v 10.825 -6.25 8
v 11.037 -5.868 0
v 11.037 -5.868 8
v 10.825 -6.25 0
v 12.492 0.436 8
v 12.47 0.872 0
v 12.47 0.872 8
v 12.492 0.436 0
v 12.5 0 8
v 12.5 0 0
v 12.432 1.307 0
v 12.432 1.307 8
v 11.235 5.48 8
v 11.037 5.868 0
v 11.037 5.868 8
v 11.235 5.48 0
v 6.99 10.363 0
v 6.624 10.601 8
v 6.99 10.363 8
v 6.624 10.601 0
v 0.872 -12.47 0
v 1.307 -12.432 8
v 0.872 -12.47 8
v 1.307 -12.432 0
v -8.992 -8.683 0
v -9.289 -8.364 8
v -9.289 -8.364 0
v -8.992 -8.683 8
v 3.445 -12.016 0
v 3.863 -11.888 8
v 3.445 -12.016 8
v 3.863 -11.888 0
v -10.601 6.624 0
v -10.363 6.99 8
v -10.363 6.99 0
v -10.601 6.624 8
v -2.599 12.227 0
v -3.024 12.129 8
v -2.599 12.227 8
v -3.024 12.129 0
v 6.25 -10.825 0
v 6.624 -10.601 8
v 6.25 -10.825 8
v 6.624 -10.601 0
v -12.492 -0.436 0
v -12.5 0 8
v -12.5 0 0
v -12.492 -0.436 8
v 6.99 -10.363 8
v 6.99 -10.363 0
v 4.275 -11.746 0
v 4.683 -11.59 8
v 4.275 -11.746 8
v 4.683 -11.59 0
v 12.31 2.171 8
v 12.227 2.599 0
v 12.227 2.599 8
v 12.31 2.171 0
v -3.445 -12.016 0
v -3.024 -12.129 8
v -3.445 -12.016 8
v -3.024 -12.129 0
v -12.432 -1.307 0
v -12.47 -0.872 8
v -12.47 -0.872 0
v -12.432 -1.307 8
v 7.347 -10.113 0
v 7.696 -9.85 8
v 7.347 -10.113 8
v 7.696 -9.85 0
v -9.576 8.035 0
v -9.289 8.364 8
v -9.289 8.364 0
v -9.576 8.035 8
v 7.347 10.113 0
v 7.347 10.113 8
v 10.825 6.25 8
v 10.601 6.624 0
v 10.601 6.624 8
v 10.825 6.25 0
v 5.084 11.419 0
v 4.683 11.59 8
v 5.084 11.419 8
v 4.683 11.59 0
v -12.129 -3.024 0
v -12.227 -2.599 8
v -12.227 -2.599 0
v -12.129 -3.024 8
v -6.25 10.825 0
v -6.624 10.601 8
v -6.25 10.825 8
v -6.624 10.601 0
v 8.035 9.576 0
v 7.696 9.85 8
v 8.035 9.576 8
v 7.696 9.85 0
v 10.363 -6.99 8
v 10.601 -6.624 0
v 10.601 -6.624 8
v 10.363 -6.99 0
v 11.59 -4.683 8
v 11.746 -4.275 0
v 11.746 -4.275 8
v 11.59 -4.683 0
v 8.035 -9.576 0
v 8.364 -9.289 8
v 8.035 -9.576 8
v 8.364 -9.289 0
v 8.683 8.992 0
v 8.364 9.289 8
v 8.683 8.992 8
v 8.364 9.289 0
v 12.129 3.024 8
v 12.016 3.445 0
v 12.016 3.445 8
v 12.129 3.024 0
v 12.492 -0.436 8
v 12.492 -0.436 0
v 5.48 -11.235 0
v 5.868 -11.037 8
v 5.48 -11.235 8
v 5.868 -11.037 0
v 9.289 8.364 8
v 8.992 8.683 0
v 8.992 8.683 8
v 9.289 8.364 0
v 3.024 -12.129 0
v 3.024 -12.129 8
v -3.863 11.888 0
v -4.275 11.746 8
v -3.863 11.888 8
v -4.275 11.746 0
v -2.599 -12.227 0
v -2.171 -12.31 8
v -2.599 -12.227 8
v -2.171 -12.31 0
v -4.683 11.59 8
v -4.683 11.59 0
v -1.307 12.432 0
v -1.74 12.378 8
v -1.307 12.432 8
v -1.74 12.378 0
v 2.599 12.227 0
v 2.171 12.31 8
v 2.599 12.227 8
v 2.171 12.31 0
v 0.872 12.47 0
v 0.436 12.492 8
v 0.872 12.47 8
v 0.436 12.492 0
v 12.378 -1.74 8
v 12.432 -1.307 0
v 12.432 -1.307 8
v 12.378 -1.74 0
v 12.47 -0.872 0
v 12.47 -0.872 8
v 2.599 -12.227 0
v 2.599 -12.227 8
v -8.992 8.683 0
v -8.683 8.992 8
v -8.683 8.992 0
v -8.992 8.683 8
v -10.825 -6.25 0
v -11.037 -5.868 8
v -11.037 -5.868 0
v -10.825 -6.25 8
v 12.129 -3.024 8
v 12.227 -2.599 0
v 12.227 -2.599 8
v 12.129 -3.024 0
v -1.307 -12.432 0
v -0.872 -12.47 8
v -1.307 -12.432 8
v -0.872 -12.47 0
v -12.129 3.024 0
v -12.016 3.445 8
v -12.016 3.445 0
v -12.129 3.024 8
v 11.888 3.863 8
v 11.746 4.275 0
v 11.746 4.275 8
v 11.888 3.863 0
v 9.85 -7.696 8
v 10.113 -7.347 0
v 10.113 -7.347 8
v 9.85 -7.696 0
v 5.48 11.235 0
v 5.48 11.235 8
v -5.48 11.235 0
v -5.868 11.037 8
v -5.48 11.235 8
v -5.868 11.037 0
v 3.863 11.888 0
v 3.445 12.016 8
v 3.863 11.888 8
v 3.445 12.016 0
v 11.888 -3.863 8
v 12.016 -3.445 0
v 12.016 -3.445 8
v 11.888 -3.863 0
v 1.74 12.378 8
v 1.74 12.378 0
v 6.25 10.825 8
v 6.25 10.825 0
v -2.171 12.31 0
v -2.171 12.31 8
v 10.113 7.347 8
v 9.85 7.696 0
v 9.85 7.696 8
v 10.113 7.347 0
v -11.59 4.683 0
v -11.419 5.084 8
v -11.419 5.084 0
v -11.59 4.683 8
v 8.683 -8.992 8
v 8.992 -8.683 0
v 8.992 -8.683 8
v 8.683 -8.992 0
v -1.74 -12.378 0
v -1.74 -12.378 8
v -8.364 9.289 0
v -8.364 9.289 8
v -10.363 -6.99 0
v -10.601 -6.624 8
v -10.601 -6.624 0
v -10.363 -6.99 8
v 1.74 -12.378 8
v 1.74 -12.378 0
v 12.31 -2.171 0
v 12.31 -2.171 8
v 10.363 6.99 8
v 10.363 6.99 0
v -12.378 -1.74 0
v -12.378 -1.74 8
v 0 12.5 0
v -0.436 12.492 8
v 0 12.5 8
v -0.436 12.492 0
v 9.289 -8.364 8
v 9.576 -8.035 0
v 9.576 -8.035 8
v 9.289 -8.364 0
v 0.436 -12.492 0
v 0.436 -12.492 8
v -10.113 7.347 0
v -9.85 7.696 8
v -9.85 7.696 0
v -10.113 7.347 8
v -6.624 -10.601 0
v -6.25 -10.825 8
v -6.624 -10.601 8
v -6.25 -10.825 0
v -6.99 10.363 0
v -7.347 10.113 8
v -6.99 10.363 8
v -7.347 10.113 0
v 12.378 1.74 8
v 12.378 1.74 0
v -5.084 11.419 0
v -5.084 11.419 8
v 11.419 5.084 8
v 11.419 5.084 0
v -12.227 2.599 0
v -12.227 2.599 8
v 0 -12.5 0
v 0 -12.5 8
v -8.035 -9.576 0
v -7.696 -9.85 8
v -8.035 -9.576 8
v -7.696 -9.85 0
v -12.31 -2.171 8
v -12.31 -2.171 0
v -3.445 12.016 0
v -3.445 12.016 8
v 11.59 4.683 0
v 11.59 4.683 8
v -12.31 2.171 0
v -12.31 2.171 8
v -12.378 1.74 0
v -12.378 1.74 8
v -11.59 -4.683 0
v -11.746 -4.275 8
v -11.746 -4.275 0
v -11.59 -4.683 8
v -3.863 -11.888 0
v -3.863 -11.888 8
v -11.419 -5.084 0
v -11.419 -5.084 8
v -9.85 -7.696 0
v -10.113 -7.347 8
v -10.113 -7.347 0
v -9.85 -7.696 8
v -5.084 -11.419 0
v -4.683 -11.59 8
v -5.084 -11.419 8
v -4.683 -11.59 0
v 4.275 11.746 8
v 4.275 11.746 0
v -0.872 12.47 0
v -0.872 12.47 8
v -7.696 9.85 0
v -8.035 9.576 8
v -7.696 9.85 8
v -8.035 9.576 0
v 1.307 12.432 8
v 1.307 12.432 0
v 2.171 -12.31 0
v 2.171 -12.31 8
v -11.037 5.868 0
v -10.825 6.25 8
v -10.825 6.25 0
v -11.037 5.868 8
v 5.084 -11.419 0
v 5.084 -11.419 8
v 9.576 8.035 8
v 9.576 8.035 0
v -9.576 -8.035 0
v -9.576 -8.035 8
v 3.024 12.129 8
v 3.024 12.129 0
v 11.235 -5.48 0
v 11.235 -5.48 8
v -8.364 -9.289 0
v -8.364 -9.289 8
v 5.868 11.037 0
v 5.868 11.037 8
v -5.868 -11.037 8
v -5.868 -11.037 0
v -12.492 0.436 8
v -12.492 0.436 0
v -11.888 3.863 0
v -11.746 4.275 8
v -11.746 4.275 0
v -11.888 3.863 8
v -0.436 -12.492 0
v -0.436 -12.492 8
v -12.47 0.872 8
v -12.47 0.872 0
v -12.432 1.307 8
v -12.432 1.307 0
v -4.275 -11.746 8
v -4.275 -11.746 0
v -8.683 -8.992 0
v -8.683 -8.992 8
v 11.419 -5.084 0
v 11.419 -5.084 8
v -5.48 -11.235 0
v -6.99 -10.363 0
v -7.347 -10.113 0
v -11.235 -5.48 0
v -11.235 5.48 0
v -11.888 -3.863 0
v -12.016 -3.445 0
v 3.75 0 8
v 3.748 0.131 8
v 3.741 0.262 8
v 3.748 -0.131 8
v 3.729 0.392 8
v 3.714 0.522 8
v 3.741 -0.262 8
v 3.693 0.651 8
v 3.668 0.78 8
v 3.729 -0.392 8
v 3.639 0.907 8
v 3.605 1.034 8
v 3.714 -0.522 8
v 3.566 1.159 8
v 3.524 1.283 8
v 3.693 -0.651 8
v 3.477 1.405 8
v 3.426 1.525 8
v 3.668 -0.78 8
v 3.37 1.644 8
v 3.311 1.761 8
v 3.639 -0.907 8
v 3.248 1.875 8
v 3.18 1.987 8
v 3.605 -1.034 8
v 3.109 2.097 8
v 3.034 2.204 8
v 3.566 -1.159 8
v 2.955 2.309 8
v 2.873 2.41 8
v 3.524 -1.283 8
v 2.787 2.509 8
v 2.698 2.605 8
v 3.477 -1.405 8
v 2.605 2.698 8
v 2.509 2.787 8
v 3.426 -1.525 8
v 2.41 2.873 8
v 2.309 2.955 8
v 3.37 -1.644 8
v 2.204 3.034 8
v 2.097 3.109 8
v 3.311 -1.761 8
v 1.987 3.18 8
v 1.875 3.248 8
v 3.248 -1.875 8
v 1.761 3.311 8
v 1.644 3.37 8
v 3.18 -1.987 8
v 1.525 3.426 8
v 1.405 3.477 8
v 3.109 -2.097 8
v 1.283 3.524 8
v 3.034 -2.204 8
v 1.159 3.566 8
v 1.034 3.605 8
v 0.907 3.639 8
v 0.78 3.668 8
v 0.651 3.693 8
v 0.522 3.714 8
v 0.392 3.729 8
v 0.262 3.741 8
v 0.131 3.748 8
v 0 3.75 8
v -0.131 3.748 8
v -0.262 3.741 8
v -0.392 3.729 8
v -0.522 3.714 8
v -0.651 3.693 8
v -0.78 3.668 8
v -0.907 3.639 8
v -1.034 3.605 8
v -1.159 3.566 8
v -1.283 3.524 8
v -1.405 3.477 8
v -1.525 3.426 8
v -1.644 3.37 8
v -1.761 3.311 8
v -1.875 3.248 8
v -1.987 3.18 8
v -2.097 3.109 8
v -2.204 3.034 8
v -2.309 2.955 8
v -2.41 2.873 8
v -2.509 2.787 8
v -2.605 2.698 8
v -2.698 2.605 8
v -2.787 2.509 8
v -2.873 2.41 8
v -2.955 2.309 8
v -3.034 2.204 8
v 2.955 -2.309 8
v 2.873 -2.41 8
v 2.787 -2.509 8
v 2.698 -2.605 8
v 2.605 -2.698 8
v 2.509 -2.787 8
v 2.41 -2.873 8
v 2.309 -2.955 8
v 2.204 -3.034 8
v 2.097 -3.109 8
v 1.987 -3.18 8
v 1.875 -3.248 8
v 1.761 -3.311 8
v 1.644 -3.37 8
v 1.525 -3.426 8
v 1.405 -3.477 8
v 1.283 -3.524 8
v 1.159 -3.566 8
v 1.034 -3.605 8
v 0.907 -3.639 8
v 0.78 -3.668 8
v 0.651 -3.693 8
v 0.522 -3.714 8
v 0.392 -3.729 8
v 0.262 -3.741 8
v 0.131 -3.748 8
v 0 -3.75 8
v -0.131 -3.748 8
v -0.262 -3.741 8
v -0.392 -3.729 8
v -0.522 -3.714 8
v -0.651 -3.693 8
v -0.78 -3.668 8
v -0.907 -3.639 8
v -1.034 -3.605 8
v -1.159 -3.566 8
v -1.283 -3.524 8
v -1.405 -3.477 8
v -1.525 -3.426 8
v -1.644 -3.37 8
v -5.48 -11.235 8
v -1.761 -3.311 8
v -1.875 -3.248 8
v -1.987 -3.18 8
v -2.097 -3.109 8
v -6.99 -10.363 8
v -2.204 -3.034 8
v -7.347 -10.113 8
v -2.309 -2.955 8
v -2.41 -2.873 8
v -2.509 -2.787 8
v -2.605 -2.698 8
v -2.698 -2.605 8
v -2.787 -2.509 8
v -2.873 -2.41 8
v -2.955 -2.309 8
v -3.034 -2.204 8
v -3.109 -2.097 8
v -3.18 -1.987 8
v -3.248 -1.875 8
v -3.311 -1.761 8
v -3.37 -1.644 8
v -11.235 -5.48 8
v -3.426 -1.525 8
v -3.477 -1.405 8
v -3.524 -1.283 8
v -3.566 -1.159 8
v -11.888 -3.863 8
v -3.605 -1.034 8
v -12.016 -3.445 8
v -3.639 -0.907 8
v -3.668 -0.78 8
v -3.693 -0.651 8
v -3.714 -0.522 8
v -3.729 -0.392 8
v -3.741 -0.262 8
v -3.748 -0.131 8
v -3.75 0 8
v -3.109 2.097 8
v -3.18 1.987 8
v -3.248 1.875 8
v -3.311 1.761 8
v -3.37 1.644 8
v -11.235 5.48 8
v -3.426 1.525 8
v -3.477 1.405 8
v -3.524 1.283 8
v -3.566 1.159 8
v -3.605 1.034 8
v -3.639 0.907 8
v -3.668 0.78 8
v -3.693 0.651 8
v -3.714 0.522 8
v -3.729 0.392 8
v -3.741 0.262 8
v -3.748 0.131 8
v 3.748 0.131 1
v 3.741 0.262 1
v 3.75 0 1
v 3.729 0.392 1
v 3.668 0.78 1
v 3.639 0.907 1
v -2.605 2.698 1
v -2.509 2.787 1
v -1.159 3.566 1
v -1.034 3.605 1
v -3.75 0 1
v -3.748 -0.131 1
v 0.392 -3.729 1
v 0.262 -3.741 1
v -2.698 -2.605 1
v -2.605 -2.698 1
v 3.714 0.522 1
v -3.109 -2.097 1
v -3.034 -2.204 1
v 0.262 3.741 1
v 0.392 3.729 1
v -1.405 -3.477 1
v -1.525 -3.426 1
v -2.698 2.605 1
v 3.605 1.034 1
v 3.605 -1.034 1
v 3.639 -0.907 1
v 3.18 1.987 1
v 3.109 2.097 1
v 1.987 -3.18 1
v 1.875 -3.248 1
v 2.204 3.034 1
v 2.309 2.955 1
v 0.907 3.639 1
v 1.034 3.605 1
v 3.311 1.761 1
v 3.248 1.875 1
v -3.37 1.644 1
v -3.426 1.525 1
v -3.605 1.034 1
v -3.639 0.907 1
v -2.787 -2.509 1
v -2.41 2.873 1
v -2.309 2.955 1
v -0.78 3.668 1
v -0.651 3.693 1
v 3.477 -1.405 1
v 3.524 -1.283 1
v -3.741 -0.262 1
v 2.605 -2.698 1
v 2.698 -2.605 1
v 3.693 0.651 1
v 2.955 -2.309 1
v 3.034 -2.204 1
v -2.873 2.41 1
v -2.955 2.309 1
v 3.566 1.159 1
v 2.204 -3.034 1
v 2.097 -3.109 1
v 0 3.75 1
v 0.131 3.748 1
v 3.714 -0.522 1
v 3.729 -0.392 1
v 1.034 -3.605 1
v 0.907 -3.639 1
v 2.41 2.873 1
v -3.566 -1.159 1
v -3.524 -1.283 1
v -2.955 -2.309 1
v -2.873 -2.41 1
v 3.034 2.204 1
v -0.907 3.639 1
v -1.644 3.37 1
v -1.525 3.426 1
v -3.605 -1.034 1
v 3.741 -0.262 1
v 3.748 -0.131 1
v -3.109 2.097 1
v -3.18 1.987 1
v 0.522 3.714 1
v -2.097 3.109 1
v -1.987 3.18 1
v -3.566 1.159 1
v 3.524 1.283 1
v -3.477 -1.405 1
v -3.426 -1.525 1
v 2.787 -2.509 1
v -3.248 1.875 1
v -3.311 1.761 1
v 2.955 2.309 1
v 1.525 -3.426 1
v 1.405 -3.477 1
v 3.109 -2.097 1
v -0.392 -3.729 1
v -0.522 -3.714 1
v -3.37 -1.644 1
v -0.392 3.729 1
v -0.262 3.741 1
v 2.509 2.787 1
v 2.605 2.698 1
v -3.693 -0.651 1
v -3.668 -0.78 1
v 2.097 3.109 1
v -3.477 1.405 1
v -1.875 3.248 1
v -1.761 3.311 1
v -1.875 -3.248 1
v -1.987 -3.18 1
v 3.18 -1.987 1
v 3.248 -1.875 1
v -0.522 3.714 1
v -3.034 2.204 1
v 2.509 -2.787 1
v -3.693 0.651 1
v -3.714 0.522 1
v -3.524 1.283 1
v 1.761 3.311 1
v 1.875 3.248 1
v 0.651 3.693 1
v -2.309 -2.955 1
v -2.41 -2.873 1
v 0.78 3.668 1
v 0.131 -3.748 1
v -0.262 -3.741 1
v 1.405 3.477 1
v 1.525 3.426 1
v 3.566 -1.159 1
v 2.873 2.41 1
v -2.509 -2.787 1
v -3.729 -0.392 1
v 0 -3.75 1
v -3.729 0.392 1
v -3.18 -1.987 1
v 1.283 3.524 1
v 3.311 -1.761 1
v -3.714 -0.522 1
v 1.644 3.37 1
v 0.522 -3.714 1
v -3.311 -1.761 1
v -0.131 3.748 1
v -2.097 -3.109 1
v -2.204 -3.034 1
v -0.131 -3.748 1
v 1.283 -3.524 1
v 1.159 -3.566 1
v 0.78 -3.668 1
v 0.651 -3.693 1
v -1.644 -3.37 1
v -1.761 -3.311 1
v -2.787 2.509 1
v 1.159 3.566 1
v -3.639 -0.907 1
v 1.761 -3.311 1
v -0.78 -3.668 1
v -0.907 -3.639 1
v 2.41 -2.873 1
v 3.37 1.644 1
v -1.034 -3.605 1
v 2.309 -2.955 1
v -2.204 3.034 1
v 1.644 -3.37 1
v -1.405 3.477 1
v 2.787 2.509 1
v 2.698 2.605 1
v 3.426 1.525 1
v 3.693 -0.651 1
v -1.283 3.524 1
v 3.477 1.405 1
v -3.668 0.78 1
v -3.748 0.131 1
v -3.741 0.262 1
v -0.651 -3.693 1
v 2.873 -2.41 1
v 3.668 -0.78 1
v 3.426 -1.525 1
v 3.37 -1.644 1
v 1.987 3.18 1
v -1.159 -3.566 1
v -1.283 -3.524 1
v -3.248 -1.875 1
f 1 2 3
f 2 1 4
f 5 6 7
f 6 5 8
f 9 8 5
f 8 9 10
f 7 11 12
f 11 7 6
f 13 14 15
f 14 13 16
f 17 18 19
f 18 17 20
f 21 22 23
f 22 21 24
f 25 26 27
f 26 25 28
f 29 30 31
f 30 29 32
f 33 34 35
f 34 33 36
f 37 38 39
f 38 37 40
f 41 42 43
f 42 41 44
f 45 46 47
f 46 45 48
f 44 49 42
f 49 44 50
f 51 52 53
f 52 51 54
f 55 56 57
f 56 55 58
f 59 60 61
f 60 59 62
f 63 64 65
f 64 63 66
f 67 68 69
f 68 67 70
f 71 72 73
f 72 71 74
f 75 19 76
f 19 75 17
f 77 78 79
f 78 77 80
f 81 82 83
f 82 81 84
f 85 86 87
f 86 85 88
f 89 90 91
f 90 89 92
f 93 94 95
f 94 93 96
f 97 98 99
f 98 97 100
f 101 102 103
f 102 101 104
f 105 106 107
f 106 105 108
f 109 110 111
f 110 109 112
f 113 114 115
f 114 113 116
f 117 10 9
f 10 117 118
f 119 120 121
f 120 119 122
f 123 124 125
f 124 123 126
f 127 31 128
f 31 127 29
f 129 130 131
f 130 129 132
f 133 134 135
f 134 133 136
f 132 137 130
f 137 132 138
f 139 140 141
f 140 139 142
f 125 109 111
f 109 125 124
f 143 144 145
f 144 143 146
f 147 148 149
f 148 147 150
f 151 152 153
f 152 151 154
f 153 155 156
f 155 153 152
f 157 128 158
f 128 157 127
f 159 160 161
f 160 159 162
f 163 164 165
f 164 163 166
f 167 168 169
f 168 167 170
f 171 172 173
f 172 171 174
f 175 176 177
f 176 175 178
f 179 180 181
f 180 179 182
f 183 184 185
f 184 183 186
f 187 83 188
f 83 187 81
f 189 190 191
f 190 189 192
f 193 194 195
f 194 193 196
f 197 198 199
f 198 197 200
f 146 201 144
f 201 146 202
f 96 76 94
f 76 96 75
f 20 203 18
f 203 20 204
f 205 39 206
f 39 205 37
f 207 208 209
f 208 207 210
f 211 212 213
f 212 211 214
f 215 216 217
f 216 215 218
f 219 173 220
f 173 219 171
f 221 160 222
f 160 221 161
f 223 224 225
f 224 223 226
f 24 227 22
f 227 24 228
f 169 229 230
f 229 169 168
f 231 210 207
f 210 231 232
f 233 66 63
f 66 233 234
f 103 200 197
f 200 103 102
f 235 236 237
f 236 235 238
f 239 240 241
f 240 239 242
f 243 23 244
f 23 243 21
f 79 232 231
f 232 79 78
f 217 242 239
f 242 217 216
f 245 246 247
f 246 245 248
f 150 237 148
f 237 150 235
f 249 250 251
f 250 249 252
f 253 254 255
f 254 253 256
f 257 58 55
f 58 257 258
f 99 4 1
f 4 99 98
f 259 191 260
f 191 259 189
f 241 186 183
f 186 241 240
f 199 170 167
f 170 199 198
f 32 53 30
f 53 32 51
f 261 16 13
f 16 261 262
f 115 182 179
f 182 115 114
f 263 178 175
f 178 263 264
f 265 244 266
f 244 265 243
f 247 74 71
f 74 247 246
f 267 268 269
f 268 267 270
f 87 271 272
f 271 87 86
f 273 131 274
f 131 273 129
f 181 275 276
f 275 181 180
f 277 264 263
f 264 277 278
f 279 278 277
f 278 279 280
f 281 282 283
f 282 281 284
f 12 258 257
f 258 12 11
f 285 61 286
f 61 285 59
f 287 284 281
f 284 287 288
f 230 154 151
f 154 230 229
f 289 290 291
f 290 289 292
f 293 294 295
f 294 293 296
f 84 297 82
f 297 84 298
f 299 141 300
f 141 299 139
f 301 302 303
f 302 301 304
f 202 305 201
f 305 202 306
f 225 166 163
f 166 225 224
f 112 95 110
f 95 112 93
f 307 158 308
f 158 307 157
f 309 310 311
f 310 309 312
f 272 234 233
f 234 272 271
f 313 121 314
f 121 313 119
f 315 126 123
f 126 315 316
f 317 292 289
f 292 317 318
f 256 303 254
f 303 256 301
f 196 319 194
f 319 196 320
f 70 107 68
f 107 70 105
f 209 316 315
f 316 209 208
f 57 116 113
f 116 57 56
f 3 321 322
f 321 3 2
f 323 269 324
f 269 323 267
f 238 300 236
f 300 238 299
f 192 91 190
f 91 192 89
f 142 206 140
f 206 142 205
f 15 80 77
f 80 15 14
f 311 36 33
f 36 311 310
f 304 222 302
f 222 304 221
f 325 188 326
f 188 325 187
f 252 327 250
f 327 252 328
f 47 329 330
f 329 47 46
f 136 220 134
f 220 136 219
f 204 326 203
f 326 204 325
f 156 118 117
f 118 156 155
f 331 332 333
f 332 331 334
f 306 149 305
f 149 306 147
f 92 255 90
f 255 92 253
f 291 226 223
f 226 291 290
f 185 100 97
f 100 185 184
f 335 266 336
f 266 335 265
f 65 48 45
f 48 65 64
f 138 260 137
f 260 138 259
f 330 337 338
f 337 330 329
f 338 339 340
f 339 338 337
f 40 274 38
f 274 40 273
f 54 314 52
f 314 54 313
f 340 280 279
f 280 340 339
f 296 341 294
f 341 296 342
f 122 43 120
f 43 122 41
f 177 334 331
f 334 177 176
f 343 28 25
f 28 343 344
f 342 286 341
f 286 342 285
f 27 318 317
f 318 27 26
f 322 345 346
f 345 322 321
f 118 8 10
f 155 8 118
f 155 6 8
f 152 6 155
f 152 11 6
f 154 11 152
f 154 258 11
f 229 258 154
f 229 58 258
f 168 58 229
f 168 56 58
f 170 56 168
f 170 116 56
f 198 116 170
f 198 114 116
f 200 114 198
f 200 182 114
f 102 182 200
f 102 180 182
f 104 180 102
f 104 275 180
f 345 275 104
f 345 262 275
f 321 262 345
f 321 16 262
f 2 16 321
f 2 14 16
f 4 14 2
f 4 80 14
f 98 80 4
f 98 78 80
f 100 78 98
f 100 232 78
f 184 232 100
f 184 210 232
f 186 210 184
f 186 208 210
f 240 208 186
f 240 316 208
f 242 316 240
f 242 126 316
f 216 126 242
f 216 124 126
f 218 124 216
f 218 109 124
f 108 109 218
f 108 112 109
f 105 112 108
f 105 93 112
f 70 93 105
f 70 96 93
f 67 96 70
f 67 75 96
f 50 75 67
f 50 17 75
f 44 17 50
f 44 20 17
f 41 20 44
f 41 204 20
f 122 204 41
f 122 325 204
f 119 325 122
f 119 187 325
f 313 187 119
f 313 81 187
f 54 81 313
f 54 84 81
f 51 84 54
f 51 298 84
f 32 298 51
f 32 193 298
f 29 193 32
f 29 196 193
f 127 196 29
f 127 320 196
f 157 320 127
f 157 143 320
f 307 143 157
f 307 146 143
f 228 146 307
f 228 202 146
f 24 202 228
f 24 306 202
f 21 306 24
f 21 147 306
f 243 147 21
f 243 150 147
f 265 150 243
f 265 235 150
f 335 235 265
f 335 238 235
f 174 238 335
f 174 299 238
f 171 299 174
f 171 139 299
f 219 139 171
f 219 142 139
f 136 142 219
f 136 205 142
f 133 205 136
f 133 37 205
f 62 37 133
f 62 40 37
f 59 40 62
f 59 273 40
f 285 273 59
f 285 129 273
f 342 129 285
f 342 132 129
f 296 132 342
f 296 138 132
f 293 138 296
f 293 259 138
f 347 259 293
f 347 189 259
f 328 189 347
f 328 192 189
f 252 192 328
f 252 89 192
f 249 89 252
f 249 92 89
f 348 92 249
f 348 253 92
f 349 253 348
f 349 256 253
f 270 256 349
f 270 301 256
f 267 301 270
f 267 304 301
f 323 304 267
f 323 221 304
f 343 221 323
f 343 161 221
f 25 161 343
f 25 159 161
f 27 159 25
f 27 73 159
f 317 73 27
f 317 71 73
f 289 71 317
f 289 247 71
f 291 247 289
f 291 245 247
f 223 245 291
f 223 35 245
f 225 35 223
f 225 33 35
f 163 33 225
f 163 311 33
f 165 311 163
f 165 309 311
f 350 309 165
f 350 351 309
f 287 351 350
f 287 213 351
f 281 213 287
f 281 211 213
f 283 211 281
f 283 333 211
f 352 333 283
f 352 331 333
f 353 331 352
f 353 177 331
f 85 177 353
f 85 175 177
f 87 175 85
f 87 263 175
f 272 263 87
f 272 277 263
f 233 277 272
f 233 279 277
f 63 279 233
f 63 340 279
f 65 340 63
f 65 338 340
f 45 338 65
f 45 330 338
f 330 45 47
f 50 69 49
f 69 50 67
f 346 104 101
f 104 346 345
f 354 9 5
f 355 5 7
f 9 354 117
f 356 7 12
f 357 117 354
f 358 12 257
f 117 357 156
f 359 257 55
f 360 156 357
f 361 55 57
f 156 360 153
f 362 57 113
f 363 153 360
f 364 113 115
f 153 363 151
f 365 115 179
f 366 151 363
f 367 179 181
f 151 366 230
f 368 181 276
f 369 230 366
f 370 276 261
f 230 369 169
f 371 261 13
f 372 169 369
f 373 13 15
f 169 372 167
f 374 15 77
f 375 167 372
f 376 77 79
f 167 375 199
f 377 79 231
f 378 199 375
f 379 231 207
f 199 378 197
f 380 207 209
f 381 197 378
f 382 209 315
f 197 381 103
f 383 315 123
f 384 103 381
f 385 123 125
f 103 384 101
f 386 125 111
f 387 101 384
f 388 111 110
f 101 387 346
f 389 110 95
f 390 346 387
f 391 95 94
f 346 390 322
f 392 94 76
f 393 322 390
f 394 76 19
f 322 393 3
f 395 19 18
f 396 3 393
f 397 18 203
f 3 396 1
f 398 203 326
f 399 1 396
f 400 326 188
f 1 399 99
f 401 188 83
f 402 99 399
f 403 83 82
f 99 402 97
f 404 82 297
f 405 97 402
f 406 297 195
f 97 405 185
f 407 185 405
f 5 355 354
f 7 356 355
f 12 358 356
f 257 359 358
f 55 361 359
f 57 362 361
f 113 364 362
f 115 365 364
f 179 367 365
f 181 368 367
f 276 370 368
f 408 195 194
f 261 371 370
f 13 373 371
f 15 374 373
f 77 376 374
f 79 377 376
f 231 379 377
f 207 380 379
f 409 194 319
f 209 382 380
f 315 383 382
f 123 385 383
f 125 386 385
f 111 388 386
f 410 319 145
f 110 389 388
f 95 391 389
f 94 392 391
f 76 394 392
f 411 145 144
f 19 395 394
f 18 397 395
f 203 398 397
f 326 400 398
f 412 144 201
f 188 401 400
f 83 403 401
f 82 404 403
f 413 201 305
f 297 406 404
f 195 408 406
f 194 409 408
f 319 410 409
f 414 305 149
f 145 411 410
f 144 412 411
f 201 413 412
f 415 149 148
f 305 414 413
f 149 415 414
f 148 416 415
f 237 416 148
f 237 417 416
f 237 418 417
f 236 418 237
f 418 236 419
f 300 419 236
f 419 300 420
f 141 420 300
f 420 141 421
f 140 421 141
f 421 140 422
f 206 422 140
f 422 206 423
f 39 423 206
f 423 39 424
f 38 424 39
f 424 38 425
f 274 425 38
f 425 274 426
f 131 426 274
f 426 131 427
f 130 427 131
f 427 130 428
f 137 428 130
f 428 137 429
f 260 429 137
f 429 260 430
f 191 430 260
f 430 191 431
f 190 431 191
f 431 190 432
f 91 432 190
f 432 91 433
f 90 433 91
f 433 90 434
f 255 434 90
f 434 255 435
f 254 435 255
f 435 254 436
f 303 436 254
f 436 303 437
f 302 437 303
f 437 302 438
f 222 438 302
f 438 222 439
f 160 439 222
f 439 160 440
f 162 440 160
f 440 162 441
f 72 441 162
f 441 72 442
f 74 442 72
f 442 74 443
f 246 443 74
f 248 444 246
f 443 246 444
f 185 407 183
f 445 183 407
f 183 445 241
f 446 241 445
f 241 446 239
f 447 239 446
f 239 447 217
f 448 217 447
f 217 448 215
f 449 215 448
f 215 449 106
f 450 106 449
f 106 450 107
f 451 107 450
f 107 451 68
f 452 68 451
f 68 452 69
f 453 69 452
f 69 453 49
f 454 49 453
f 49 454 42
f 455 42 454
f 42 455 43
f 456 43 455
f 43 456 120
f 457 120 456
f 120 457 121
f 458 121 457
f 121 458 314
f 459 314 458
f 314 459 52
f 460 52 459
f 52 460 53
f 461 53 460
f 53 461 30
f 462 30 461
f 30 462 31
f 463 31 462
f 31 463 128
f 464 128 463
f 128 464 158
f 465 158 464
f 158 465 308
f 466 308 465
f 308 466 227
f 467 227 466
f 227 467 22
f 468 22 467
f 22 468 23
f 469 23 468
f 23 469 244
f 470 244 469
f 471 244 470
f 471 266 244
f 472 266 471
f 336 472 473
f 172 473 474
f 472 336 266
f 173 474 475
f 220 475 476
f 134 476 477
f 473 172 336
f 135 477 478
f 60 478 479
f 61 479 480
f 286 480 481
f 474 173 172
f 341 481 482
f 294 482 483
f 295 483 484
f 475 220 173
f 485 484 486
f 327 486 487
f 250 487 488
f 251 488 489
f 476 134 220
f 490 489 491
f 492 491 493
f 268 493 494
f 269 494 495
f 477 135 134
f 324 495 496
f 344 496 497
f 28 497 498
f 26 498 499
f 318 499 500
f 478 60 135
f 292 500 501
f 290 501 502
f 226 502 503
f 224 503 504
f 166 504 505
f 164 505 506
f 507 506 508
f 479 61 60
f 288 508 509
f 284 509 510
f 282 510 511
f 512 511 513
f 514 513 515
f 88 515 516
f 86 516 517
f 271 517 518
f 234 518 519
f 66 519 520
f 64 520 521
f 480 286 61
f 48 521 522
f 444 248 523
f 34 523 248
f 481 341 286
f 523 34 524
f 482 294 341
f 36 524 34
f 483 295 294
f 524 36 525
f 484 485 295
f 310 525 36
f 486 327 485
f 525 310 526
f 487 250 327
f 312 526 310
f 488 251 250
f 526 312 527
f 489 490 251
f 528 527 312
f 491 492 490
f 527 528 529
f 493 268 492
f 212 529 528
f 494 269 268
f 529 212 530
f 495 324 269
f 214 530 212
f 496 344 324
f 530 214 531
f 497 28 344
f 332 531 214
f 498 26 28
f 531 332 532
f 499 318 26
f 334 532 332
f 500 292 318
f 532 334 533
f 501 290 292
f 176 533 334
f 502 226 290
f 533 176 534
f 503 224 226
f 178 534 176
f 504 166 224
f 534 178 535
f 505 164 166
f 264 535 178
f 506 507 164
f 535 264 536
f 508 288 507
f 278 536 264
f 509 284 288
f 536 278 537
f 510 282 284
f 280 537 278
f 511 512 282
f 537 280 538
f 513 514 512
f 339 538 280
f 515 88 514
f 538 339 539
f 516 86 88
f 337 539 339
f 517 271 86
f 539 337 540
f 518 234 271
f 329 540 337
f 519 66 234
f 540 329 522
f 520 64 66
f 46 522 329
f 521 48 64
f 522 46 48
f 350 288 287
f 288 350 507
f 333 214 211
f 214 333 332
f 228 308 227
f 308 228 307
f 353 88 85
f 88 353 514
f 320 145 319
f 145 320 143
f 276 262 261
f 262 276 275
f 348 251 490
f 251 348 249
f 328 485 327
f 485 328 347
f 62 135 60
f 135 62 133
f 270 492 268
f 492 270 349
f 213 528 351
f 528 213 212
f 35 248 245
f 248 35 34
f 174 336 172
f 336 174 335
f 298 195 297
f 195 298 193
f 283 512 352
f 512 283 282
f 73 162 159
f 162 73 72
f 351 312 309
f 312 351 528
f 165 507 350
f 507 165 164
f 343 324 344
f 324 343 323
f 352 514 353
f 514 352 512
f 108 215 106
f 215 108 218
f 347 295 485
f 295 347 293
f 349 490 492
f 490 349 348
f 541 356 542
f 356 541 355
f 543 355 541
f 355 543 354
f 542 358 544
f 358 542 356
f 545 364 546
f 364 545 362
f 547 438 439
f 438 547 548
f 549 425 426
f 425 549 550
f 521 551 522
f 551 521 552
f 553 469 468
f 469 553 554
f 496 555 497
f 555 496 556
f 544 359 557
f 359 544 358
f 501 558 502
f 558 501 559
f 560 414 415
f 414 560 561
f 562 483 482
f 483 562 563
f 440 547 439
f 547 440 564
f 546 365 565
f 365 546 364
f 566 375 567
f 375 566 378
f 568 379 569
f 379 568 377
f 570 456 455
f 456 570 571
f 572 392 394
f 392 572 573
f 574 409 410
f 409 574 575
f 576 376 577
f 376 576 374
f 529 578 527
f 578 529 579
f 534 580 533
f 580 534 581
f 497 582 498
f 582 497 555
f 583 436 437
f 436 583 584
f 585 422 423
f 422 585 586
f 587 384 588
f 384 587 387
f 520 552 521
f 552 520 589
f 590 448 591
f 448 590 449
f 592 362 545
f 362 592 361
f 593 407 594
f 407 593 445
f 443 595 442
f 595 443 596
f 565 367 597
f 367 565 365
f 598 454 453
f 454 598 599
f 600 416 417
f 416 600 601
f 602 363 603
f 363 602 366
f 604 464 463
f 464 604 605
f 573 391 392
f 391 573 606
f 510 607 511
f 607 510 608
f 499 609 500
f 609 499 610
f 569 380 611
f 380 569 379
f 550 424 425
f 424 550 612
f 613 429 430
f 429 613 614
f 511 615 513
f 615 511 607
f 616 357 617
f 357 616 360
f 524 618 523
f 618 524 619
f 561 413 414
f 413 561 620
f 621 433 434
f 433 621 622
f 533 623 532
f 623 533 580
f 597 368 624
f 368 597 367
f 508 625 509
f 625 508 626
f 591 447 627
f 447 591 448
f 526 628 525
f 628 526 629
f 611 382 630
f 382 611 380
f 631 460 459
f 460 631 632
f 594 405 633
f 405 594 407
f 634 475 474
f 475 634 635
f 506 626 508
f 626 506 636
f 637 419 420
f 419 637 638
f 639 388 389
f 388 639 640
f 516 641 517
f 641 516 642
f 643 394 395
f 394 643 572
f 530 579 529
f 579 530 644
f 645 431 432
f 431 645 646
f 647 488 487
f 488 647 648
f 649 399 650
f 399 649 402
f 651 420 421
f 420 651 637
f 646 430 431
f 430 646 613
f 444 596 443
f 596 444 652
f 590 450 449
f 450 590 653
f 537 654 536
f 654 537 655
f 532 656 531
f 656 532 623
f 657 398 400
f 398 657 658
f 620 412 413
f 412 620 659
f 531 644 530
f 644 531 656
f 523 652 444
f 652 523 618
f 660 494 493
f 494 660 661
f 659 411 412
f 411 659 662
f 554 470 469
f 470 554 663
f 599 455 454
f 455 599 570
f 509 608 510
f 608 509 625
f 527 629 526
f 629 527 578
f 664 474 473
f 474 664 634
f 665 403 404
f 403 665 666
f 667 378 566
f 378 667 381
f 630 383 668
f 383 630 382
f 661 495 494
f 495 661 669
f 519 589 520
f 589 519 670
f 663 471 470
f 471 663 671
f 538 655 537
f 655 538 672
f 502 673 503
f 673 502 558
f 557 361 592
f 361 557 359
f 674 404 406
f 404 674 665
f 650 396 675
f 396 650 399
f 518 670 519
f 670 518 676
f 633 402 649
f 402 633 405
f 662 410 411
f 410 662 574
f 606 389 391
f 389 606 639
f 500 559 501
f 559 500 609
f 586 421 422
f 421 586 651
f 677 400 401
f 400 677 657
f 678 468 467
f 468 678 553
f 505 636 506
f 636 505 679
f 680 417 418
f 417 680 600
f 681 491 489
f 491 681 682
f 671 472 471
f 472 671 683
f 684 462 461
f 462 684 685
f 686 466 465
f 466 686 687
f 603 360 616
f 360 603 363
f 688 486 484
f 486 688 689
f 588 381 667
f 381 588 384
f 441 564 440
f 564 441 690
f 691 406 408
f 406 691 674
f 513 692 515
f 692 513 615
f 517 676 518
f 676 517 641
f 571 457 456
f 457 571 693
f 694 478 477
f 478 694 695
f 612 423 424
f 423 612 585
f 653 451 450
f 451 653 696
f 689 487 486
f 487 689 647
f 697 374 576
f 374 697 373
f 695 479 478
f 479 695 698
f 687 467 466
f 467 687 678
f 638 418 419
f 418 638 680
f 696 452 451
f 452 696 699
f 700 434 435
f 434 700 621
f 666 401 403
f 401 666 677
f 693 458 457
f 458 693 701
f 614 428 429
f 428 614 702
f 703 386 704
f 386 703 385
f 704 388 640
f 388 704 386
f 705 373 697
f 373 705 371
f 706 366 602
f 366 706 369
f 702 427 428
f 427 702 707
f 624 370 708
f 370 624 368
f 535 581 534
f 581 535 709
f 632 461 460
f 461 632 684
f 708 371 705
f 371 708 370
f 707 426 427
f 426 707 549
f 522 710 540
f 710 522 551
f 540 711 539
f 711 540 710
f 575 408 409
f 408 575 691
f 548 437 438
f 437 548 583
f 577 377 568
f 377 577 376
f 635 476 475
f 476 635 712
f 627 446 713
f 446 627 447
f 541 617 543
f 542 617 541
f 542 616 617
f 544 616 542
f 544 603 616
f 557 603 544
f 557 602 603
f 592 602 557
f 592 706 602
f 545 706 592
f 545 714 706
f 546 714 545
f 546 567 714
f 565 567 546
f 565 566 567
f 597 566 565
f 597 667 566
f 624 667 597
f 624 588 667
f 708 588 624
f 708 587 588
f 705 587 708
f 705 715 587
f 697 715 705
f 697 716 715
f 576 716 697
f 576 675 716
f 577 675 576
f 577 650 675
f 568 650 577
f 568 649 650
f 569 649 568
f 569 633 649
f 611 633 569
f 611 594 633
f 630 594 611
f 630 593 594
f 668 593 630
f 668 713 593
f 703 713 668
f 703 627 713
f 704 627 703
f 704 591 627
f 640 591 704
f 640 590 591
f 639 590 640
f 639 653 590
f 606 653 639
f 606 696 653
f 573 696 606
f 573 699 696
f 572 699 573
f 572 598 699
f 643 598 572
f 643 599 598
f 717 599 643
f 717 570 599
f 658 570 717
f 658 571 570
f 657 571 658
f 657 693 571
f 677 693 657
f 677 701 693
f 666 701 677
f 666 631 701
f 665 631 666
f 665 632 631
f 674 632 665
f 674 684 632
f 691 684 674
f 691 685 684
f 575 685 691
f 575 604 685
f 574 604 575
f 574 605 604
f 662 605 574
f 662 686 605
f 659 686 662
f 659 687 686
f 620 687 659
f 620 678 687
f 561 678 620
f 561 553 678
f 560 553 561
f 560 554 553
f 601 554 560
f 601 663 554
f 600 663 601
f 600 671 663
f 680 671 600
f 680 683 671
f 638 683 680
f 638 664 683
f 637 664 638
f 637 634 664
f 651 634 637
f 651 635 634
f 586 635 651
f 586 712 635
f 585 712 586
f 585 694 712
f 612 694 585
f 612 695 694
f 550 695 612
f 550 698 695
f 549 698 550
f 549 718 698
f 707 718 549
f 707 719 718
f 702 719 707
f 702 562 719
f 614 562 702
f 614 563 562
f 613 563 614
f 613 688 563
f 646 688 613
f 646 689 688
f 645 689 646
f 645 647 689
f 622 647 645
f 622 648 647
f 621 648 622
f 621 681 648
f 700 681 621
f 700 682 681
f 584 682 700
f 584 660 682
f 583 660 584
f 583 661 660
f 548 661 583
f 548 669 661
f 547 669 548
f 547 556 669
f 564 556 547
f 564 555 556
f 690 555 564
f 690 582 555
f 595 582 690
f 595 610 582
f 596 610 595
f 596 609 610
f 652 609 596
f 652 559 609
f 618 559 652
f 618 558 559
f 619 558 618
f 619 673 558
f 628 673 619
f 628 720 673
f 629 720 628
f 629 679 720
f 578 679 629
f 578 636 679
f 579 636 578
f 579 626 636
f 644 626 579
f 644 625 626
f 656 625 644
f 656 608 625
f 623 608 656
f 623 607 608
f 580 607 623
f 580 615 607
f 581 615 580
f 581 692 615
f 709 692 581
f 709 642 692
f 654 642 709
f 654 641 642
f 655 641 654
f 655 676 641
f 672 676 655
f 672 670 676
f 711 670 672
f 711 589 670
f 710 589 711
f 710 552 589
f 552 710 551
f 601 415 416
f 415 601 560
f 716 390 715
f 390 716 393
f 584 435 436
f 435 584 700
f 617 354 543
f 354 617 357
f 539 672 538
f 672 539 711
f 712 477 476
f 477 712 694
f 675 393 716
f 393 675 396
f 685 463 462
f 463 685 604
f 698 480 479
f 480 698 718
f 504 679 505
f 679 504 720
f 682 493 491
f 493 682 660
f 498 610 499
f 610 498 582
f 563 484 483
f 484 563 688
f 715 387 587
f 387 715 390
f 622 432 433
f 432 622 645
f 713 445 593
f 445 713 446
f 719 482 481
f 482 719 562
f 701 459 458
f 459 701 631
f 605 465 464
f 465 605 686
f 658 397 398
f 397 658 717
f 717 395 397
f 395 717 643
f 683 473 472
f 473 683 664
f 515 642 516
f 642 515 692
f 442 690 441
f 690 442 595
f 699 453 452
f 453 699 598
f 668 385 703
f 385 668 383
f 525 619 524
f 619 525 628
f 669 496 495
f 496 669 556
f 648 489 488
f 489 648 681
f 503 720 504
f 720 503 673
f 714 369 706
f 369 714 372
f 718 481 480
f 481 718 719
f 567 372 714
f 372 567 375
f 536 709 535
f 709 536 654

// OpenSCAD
base=25;
hole=7.5;
hole_depth=7;
$fn=180;
difference() {
cylinder(d=base,h=hole_depth+1);
translate([0,0,1]) cylinder(d=hole,h=100);
}
